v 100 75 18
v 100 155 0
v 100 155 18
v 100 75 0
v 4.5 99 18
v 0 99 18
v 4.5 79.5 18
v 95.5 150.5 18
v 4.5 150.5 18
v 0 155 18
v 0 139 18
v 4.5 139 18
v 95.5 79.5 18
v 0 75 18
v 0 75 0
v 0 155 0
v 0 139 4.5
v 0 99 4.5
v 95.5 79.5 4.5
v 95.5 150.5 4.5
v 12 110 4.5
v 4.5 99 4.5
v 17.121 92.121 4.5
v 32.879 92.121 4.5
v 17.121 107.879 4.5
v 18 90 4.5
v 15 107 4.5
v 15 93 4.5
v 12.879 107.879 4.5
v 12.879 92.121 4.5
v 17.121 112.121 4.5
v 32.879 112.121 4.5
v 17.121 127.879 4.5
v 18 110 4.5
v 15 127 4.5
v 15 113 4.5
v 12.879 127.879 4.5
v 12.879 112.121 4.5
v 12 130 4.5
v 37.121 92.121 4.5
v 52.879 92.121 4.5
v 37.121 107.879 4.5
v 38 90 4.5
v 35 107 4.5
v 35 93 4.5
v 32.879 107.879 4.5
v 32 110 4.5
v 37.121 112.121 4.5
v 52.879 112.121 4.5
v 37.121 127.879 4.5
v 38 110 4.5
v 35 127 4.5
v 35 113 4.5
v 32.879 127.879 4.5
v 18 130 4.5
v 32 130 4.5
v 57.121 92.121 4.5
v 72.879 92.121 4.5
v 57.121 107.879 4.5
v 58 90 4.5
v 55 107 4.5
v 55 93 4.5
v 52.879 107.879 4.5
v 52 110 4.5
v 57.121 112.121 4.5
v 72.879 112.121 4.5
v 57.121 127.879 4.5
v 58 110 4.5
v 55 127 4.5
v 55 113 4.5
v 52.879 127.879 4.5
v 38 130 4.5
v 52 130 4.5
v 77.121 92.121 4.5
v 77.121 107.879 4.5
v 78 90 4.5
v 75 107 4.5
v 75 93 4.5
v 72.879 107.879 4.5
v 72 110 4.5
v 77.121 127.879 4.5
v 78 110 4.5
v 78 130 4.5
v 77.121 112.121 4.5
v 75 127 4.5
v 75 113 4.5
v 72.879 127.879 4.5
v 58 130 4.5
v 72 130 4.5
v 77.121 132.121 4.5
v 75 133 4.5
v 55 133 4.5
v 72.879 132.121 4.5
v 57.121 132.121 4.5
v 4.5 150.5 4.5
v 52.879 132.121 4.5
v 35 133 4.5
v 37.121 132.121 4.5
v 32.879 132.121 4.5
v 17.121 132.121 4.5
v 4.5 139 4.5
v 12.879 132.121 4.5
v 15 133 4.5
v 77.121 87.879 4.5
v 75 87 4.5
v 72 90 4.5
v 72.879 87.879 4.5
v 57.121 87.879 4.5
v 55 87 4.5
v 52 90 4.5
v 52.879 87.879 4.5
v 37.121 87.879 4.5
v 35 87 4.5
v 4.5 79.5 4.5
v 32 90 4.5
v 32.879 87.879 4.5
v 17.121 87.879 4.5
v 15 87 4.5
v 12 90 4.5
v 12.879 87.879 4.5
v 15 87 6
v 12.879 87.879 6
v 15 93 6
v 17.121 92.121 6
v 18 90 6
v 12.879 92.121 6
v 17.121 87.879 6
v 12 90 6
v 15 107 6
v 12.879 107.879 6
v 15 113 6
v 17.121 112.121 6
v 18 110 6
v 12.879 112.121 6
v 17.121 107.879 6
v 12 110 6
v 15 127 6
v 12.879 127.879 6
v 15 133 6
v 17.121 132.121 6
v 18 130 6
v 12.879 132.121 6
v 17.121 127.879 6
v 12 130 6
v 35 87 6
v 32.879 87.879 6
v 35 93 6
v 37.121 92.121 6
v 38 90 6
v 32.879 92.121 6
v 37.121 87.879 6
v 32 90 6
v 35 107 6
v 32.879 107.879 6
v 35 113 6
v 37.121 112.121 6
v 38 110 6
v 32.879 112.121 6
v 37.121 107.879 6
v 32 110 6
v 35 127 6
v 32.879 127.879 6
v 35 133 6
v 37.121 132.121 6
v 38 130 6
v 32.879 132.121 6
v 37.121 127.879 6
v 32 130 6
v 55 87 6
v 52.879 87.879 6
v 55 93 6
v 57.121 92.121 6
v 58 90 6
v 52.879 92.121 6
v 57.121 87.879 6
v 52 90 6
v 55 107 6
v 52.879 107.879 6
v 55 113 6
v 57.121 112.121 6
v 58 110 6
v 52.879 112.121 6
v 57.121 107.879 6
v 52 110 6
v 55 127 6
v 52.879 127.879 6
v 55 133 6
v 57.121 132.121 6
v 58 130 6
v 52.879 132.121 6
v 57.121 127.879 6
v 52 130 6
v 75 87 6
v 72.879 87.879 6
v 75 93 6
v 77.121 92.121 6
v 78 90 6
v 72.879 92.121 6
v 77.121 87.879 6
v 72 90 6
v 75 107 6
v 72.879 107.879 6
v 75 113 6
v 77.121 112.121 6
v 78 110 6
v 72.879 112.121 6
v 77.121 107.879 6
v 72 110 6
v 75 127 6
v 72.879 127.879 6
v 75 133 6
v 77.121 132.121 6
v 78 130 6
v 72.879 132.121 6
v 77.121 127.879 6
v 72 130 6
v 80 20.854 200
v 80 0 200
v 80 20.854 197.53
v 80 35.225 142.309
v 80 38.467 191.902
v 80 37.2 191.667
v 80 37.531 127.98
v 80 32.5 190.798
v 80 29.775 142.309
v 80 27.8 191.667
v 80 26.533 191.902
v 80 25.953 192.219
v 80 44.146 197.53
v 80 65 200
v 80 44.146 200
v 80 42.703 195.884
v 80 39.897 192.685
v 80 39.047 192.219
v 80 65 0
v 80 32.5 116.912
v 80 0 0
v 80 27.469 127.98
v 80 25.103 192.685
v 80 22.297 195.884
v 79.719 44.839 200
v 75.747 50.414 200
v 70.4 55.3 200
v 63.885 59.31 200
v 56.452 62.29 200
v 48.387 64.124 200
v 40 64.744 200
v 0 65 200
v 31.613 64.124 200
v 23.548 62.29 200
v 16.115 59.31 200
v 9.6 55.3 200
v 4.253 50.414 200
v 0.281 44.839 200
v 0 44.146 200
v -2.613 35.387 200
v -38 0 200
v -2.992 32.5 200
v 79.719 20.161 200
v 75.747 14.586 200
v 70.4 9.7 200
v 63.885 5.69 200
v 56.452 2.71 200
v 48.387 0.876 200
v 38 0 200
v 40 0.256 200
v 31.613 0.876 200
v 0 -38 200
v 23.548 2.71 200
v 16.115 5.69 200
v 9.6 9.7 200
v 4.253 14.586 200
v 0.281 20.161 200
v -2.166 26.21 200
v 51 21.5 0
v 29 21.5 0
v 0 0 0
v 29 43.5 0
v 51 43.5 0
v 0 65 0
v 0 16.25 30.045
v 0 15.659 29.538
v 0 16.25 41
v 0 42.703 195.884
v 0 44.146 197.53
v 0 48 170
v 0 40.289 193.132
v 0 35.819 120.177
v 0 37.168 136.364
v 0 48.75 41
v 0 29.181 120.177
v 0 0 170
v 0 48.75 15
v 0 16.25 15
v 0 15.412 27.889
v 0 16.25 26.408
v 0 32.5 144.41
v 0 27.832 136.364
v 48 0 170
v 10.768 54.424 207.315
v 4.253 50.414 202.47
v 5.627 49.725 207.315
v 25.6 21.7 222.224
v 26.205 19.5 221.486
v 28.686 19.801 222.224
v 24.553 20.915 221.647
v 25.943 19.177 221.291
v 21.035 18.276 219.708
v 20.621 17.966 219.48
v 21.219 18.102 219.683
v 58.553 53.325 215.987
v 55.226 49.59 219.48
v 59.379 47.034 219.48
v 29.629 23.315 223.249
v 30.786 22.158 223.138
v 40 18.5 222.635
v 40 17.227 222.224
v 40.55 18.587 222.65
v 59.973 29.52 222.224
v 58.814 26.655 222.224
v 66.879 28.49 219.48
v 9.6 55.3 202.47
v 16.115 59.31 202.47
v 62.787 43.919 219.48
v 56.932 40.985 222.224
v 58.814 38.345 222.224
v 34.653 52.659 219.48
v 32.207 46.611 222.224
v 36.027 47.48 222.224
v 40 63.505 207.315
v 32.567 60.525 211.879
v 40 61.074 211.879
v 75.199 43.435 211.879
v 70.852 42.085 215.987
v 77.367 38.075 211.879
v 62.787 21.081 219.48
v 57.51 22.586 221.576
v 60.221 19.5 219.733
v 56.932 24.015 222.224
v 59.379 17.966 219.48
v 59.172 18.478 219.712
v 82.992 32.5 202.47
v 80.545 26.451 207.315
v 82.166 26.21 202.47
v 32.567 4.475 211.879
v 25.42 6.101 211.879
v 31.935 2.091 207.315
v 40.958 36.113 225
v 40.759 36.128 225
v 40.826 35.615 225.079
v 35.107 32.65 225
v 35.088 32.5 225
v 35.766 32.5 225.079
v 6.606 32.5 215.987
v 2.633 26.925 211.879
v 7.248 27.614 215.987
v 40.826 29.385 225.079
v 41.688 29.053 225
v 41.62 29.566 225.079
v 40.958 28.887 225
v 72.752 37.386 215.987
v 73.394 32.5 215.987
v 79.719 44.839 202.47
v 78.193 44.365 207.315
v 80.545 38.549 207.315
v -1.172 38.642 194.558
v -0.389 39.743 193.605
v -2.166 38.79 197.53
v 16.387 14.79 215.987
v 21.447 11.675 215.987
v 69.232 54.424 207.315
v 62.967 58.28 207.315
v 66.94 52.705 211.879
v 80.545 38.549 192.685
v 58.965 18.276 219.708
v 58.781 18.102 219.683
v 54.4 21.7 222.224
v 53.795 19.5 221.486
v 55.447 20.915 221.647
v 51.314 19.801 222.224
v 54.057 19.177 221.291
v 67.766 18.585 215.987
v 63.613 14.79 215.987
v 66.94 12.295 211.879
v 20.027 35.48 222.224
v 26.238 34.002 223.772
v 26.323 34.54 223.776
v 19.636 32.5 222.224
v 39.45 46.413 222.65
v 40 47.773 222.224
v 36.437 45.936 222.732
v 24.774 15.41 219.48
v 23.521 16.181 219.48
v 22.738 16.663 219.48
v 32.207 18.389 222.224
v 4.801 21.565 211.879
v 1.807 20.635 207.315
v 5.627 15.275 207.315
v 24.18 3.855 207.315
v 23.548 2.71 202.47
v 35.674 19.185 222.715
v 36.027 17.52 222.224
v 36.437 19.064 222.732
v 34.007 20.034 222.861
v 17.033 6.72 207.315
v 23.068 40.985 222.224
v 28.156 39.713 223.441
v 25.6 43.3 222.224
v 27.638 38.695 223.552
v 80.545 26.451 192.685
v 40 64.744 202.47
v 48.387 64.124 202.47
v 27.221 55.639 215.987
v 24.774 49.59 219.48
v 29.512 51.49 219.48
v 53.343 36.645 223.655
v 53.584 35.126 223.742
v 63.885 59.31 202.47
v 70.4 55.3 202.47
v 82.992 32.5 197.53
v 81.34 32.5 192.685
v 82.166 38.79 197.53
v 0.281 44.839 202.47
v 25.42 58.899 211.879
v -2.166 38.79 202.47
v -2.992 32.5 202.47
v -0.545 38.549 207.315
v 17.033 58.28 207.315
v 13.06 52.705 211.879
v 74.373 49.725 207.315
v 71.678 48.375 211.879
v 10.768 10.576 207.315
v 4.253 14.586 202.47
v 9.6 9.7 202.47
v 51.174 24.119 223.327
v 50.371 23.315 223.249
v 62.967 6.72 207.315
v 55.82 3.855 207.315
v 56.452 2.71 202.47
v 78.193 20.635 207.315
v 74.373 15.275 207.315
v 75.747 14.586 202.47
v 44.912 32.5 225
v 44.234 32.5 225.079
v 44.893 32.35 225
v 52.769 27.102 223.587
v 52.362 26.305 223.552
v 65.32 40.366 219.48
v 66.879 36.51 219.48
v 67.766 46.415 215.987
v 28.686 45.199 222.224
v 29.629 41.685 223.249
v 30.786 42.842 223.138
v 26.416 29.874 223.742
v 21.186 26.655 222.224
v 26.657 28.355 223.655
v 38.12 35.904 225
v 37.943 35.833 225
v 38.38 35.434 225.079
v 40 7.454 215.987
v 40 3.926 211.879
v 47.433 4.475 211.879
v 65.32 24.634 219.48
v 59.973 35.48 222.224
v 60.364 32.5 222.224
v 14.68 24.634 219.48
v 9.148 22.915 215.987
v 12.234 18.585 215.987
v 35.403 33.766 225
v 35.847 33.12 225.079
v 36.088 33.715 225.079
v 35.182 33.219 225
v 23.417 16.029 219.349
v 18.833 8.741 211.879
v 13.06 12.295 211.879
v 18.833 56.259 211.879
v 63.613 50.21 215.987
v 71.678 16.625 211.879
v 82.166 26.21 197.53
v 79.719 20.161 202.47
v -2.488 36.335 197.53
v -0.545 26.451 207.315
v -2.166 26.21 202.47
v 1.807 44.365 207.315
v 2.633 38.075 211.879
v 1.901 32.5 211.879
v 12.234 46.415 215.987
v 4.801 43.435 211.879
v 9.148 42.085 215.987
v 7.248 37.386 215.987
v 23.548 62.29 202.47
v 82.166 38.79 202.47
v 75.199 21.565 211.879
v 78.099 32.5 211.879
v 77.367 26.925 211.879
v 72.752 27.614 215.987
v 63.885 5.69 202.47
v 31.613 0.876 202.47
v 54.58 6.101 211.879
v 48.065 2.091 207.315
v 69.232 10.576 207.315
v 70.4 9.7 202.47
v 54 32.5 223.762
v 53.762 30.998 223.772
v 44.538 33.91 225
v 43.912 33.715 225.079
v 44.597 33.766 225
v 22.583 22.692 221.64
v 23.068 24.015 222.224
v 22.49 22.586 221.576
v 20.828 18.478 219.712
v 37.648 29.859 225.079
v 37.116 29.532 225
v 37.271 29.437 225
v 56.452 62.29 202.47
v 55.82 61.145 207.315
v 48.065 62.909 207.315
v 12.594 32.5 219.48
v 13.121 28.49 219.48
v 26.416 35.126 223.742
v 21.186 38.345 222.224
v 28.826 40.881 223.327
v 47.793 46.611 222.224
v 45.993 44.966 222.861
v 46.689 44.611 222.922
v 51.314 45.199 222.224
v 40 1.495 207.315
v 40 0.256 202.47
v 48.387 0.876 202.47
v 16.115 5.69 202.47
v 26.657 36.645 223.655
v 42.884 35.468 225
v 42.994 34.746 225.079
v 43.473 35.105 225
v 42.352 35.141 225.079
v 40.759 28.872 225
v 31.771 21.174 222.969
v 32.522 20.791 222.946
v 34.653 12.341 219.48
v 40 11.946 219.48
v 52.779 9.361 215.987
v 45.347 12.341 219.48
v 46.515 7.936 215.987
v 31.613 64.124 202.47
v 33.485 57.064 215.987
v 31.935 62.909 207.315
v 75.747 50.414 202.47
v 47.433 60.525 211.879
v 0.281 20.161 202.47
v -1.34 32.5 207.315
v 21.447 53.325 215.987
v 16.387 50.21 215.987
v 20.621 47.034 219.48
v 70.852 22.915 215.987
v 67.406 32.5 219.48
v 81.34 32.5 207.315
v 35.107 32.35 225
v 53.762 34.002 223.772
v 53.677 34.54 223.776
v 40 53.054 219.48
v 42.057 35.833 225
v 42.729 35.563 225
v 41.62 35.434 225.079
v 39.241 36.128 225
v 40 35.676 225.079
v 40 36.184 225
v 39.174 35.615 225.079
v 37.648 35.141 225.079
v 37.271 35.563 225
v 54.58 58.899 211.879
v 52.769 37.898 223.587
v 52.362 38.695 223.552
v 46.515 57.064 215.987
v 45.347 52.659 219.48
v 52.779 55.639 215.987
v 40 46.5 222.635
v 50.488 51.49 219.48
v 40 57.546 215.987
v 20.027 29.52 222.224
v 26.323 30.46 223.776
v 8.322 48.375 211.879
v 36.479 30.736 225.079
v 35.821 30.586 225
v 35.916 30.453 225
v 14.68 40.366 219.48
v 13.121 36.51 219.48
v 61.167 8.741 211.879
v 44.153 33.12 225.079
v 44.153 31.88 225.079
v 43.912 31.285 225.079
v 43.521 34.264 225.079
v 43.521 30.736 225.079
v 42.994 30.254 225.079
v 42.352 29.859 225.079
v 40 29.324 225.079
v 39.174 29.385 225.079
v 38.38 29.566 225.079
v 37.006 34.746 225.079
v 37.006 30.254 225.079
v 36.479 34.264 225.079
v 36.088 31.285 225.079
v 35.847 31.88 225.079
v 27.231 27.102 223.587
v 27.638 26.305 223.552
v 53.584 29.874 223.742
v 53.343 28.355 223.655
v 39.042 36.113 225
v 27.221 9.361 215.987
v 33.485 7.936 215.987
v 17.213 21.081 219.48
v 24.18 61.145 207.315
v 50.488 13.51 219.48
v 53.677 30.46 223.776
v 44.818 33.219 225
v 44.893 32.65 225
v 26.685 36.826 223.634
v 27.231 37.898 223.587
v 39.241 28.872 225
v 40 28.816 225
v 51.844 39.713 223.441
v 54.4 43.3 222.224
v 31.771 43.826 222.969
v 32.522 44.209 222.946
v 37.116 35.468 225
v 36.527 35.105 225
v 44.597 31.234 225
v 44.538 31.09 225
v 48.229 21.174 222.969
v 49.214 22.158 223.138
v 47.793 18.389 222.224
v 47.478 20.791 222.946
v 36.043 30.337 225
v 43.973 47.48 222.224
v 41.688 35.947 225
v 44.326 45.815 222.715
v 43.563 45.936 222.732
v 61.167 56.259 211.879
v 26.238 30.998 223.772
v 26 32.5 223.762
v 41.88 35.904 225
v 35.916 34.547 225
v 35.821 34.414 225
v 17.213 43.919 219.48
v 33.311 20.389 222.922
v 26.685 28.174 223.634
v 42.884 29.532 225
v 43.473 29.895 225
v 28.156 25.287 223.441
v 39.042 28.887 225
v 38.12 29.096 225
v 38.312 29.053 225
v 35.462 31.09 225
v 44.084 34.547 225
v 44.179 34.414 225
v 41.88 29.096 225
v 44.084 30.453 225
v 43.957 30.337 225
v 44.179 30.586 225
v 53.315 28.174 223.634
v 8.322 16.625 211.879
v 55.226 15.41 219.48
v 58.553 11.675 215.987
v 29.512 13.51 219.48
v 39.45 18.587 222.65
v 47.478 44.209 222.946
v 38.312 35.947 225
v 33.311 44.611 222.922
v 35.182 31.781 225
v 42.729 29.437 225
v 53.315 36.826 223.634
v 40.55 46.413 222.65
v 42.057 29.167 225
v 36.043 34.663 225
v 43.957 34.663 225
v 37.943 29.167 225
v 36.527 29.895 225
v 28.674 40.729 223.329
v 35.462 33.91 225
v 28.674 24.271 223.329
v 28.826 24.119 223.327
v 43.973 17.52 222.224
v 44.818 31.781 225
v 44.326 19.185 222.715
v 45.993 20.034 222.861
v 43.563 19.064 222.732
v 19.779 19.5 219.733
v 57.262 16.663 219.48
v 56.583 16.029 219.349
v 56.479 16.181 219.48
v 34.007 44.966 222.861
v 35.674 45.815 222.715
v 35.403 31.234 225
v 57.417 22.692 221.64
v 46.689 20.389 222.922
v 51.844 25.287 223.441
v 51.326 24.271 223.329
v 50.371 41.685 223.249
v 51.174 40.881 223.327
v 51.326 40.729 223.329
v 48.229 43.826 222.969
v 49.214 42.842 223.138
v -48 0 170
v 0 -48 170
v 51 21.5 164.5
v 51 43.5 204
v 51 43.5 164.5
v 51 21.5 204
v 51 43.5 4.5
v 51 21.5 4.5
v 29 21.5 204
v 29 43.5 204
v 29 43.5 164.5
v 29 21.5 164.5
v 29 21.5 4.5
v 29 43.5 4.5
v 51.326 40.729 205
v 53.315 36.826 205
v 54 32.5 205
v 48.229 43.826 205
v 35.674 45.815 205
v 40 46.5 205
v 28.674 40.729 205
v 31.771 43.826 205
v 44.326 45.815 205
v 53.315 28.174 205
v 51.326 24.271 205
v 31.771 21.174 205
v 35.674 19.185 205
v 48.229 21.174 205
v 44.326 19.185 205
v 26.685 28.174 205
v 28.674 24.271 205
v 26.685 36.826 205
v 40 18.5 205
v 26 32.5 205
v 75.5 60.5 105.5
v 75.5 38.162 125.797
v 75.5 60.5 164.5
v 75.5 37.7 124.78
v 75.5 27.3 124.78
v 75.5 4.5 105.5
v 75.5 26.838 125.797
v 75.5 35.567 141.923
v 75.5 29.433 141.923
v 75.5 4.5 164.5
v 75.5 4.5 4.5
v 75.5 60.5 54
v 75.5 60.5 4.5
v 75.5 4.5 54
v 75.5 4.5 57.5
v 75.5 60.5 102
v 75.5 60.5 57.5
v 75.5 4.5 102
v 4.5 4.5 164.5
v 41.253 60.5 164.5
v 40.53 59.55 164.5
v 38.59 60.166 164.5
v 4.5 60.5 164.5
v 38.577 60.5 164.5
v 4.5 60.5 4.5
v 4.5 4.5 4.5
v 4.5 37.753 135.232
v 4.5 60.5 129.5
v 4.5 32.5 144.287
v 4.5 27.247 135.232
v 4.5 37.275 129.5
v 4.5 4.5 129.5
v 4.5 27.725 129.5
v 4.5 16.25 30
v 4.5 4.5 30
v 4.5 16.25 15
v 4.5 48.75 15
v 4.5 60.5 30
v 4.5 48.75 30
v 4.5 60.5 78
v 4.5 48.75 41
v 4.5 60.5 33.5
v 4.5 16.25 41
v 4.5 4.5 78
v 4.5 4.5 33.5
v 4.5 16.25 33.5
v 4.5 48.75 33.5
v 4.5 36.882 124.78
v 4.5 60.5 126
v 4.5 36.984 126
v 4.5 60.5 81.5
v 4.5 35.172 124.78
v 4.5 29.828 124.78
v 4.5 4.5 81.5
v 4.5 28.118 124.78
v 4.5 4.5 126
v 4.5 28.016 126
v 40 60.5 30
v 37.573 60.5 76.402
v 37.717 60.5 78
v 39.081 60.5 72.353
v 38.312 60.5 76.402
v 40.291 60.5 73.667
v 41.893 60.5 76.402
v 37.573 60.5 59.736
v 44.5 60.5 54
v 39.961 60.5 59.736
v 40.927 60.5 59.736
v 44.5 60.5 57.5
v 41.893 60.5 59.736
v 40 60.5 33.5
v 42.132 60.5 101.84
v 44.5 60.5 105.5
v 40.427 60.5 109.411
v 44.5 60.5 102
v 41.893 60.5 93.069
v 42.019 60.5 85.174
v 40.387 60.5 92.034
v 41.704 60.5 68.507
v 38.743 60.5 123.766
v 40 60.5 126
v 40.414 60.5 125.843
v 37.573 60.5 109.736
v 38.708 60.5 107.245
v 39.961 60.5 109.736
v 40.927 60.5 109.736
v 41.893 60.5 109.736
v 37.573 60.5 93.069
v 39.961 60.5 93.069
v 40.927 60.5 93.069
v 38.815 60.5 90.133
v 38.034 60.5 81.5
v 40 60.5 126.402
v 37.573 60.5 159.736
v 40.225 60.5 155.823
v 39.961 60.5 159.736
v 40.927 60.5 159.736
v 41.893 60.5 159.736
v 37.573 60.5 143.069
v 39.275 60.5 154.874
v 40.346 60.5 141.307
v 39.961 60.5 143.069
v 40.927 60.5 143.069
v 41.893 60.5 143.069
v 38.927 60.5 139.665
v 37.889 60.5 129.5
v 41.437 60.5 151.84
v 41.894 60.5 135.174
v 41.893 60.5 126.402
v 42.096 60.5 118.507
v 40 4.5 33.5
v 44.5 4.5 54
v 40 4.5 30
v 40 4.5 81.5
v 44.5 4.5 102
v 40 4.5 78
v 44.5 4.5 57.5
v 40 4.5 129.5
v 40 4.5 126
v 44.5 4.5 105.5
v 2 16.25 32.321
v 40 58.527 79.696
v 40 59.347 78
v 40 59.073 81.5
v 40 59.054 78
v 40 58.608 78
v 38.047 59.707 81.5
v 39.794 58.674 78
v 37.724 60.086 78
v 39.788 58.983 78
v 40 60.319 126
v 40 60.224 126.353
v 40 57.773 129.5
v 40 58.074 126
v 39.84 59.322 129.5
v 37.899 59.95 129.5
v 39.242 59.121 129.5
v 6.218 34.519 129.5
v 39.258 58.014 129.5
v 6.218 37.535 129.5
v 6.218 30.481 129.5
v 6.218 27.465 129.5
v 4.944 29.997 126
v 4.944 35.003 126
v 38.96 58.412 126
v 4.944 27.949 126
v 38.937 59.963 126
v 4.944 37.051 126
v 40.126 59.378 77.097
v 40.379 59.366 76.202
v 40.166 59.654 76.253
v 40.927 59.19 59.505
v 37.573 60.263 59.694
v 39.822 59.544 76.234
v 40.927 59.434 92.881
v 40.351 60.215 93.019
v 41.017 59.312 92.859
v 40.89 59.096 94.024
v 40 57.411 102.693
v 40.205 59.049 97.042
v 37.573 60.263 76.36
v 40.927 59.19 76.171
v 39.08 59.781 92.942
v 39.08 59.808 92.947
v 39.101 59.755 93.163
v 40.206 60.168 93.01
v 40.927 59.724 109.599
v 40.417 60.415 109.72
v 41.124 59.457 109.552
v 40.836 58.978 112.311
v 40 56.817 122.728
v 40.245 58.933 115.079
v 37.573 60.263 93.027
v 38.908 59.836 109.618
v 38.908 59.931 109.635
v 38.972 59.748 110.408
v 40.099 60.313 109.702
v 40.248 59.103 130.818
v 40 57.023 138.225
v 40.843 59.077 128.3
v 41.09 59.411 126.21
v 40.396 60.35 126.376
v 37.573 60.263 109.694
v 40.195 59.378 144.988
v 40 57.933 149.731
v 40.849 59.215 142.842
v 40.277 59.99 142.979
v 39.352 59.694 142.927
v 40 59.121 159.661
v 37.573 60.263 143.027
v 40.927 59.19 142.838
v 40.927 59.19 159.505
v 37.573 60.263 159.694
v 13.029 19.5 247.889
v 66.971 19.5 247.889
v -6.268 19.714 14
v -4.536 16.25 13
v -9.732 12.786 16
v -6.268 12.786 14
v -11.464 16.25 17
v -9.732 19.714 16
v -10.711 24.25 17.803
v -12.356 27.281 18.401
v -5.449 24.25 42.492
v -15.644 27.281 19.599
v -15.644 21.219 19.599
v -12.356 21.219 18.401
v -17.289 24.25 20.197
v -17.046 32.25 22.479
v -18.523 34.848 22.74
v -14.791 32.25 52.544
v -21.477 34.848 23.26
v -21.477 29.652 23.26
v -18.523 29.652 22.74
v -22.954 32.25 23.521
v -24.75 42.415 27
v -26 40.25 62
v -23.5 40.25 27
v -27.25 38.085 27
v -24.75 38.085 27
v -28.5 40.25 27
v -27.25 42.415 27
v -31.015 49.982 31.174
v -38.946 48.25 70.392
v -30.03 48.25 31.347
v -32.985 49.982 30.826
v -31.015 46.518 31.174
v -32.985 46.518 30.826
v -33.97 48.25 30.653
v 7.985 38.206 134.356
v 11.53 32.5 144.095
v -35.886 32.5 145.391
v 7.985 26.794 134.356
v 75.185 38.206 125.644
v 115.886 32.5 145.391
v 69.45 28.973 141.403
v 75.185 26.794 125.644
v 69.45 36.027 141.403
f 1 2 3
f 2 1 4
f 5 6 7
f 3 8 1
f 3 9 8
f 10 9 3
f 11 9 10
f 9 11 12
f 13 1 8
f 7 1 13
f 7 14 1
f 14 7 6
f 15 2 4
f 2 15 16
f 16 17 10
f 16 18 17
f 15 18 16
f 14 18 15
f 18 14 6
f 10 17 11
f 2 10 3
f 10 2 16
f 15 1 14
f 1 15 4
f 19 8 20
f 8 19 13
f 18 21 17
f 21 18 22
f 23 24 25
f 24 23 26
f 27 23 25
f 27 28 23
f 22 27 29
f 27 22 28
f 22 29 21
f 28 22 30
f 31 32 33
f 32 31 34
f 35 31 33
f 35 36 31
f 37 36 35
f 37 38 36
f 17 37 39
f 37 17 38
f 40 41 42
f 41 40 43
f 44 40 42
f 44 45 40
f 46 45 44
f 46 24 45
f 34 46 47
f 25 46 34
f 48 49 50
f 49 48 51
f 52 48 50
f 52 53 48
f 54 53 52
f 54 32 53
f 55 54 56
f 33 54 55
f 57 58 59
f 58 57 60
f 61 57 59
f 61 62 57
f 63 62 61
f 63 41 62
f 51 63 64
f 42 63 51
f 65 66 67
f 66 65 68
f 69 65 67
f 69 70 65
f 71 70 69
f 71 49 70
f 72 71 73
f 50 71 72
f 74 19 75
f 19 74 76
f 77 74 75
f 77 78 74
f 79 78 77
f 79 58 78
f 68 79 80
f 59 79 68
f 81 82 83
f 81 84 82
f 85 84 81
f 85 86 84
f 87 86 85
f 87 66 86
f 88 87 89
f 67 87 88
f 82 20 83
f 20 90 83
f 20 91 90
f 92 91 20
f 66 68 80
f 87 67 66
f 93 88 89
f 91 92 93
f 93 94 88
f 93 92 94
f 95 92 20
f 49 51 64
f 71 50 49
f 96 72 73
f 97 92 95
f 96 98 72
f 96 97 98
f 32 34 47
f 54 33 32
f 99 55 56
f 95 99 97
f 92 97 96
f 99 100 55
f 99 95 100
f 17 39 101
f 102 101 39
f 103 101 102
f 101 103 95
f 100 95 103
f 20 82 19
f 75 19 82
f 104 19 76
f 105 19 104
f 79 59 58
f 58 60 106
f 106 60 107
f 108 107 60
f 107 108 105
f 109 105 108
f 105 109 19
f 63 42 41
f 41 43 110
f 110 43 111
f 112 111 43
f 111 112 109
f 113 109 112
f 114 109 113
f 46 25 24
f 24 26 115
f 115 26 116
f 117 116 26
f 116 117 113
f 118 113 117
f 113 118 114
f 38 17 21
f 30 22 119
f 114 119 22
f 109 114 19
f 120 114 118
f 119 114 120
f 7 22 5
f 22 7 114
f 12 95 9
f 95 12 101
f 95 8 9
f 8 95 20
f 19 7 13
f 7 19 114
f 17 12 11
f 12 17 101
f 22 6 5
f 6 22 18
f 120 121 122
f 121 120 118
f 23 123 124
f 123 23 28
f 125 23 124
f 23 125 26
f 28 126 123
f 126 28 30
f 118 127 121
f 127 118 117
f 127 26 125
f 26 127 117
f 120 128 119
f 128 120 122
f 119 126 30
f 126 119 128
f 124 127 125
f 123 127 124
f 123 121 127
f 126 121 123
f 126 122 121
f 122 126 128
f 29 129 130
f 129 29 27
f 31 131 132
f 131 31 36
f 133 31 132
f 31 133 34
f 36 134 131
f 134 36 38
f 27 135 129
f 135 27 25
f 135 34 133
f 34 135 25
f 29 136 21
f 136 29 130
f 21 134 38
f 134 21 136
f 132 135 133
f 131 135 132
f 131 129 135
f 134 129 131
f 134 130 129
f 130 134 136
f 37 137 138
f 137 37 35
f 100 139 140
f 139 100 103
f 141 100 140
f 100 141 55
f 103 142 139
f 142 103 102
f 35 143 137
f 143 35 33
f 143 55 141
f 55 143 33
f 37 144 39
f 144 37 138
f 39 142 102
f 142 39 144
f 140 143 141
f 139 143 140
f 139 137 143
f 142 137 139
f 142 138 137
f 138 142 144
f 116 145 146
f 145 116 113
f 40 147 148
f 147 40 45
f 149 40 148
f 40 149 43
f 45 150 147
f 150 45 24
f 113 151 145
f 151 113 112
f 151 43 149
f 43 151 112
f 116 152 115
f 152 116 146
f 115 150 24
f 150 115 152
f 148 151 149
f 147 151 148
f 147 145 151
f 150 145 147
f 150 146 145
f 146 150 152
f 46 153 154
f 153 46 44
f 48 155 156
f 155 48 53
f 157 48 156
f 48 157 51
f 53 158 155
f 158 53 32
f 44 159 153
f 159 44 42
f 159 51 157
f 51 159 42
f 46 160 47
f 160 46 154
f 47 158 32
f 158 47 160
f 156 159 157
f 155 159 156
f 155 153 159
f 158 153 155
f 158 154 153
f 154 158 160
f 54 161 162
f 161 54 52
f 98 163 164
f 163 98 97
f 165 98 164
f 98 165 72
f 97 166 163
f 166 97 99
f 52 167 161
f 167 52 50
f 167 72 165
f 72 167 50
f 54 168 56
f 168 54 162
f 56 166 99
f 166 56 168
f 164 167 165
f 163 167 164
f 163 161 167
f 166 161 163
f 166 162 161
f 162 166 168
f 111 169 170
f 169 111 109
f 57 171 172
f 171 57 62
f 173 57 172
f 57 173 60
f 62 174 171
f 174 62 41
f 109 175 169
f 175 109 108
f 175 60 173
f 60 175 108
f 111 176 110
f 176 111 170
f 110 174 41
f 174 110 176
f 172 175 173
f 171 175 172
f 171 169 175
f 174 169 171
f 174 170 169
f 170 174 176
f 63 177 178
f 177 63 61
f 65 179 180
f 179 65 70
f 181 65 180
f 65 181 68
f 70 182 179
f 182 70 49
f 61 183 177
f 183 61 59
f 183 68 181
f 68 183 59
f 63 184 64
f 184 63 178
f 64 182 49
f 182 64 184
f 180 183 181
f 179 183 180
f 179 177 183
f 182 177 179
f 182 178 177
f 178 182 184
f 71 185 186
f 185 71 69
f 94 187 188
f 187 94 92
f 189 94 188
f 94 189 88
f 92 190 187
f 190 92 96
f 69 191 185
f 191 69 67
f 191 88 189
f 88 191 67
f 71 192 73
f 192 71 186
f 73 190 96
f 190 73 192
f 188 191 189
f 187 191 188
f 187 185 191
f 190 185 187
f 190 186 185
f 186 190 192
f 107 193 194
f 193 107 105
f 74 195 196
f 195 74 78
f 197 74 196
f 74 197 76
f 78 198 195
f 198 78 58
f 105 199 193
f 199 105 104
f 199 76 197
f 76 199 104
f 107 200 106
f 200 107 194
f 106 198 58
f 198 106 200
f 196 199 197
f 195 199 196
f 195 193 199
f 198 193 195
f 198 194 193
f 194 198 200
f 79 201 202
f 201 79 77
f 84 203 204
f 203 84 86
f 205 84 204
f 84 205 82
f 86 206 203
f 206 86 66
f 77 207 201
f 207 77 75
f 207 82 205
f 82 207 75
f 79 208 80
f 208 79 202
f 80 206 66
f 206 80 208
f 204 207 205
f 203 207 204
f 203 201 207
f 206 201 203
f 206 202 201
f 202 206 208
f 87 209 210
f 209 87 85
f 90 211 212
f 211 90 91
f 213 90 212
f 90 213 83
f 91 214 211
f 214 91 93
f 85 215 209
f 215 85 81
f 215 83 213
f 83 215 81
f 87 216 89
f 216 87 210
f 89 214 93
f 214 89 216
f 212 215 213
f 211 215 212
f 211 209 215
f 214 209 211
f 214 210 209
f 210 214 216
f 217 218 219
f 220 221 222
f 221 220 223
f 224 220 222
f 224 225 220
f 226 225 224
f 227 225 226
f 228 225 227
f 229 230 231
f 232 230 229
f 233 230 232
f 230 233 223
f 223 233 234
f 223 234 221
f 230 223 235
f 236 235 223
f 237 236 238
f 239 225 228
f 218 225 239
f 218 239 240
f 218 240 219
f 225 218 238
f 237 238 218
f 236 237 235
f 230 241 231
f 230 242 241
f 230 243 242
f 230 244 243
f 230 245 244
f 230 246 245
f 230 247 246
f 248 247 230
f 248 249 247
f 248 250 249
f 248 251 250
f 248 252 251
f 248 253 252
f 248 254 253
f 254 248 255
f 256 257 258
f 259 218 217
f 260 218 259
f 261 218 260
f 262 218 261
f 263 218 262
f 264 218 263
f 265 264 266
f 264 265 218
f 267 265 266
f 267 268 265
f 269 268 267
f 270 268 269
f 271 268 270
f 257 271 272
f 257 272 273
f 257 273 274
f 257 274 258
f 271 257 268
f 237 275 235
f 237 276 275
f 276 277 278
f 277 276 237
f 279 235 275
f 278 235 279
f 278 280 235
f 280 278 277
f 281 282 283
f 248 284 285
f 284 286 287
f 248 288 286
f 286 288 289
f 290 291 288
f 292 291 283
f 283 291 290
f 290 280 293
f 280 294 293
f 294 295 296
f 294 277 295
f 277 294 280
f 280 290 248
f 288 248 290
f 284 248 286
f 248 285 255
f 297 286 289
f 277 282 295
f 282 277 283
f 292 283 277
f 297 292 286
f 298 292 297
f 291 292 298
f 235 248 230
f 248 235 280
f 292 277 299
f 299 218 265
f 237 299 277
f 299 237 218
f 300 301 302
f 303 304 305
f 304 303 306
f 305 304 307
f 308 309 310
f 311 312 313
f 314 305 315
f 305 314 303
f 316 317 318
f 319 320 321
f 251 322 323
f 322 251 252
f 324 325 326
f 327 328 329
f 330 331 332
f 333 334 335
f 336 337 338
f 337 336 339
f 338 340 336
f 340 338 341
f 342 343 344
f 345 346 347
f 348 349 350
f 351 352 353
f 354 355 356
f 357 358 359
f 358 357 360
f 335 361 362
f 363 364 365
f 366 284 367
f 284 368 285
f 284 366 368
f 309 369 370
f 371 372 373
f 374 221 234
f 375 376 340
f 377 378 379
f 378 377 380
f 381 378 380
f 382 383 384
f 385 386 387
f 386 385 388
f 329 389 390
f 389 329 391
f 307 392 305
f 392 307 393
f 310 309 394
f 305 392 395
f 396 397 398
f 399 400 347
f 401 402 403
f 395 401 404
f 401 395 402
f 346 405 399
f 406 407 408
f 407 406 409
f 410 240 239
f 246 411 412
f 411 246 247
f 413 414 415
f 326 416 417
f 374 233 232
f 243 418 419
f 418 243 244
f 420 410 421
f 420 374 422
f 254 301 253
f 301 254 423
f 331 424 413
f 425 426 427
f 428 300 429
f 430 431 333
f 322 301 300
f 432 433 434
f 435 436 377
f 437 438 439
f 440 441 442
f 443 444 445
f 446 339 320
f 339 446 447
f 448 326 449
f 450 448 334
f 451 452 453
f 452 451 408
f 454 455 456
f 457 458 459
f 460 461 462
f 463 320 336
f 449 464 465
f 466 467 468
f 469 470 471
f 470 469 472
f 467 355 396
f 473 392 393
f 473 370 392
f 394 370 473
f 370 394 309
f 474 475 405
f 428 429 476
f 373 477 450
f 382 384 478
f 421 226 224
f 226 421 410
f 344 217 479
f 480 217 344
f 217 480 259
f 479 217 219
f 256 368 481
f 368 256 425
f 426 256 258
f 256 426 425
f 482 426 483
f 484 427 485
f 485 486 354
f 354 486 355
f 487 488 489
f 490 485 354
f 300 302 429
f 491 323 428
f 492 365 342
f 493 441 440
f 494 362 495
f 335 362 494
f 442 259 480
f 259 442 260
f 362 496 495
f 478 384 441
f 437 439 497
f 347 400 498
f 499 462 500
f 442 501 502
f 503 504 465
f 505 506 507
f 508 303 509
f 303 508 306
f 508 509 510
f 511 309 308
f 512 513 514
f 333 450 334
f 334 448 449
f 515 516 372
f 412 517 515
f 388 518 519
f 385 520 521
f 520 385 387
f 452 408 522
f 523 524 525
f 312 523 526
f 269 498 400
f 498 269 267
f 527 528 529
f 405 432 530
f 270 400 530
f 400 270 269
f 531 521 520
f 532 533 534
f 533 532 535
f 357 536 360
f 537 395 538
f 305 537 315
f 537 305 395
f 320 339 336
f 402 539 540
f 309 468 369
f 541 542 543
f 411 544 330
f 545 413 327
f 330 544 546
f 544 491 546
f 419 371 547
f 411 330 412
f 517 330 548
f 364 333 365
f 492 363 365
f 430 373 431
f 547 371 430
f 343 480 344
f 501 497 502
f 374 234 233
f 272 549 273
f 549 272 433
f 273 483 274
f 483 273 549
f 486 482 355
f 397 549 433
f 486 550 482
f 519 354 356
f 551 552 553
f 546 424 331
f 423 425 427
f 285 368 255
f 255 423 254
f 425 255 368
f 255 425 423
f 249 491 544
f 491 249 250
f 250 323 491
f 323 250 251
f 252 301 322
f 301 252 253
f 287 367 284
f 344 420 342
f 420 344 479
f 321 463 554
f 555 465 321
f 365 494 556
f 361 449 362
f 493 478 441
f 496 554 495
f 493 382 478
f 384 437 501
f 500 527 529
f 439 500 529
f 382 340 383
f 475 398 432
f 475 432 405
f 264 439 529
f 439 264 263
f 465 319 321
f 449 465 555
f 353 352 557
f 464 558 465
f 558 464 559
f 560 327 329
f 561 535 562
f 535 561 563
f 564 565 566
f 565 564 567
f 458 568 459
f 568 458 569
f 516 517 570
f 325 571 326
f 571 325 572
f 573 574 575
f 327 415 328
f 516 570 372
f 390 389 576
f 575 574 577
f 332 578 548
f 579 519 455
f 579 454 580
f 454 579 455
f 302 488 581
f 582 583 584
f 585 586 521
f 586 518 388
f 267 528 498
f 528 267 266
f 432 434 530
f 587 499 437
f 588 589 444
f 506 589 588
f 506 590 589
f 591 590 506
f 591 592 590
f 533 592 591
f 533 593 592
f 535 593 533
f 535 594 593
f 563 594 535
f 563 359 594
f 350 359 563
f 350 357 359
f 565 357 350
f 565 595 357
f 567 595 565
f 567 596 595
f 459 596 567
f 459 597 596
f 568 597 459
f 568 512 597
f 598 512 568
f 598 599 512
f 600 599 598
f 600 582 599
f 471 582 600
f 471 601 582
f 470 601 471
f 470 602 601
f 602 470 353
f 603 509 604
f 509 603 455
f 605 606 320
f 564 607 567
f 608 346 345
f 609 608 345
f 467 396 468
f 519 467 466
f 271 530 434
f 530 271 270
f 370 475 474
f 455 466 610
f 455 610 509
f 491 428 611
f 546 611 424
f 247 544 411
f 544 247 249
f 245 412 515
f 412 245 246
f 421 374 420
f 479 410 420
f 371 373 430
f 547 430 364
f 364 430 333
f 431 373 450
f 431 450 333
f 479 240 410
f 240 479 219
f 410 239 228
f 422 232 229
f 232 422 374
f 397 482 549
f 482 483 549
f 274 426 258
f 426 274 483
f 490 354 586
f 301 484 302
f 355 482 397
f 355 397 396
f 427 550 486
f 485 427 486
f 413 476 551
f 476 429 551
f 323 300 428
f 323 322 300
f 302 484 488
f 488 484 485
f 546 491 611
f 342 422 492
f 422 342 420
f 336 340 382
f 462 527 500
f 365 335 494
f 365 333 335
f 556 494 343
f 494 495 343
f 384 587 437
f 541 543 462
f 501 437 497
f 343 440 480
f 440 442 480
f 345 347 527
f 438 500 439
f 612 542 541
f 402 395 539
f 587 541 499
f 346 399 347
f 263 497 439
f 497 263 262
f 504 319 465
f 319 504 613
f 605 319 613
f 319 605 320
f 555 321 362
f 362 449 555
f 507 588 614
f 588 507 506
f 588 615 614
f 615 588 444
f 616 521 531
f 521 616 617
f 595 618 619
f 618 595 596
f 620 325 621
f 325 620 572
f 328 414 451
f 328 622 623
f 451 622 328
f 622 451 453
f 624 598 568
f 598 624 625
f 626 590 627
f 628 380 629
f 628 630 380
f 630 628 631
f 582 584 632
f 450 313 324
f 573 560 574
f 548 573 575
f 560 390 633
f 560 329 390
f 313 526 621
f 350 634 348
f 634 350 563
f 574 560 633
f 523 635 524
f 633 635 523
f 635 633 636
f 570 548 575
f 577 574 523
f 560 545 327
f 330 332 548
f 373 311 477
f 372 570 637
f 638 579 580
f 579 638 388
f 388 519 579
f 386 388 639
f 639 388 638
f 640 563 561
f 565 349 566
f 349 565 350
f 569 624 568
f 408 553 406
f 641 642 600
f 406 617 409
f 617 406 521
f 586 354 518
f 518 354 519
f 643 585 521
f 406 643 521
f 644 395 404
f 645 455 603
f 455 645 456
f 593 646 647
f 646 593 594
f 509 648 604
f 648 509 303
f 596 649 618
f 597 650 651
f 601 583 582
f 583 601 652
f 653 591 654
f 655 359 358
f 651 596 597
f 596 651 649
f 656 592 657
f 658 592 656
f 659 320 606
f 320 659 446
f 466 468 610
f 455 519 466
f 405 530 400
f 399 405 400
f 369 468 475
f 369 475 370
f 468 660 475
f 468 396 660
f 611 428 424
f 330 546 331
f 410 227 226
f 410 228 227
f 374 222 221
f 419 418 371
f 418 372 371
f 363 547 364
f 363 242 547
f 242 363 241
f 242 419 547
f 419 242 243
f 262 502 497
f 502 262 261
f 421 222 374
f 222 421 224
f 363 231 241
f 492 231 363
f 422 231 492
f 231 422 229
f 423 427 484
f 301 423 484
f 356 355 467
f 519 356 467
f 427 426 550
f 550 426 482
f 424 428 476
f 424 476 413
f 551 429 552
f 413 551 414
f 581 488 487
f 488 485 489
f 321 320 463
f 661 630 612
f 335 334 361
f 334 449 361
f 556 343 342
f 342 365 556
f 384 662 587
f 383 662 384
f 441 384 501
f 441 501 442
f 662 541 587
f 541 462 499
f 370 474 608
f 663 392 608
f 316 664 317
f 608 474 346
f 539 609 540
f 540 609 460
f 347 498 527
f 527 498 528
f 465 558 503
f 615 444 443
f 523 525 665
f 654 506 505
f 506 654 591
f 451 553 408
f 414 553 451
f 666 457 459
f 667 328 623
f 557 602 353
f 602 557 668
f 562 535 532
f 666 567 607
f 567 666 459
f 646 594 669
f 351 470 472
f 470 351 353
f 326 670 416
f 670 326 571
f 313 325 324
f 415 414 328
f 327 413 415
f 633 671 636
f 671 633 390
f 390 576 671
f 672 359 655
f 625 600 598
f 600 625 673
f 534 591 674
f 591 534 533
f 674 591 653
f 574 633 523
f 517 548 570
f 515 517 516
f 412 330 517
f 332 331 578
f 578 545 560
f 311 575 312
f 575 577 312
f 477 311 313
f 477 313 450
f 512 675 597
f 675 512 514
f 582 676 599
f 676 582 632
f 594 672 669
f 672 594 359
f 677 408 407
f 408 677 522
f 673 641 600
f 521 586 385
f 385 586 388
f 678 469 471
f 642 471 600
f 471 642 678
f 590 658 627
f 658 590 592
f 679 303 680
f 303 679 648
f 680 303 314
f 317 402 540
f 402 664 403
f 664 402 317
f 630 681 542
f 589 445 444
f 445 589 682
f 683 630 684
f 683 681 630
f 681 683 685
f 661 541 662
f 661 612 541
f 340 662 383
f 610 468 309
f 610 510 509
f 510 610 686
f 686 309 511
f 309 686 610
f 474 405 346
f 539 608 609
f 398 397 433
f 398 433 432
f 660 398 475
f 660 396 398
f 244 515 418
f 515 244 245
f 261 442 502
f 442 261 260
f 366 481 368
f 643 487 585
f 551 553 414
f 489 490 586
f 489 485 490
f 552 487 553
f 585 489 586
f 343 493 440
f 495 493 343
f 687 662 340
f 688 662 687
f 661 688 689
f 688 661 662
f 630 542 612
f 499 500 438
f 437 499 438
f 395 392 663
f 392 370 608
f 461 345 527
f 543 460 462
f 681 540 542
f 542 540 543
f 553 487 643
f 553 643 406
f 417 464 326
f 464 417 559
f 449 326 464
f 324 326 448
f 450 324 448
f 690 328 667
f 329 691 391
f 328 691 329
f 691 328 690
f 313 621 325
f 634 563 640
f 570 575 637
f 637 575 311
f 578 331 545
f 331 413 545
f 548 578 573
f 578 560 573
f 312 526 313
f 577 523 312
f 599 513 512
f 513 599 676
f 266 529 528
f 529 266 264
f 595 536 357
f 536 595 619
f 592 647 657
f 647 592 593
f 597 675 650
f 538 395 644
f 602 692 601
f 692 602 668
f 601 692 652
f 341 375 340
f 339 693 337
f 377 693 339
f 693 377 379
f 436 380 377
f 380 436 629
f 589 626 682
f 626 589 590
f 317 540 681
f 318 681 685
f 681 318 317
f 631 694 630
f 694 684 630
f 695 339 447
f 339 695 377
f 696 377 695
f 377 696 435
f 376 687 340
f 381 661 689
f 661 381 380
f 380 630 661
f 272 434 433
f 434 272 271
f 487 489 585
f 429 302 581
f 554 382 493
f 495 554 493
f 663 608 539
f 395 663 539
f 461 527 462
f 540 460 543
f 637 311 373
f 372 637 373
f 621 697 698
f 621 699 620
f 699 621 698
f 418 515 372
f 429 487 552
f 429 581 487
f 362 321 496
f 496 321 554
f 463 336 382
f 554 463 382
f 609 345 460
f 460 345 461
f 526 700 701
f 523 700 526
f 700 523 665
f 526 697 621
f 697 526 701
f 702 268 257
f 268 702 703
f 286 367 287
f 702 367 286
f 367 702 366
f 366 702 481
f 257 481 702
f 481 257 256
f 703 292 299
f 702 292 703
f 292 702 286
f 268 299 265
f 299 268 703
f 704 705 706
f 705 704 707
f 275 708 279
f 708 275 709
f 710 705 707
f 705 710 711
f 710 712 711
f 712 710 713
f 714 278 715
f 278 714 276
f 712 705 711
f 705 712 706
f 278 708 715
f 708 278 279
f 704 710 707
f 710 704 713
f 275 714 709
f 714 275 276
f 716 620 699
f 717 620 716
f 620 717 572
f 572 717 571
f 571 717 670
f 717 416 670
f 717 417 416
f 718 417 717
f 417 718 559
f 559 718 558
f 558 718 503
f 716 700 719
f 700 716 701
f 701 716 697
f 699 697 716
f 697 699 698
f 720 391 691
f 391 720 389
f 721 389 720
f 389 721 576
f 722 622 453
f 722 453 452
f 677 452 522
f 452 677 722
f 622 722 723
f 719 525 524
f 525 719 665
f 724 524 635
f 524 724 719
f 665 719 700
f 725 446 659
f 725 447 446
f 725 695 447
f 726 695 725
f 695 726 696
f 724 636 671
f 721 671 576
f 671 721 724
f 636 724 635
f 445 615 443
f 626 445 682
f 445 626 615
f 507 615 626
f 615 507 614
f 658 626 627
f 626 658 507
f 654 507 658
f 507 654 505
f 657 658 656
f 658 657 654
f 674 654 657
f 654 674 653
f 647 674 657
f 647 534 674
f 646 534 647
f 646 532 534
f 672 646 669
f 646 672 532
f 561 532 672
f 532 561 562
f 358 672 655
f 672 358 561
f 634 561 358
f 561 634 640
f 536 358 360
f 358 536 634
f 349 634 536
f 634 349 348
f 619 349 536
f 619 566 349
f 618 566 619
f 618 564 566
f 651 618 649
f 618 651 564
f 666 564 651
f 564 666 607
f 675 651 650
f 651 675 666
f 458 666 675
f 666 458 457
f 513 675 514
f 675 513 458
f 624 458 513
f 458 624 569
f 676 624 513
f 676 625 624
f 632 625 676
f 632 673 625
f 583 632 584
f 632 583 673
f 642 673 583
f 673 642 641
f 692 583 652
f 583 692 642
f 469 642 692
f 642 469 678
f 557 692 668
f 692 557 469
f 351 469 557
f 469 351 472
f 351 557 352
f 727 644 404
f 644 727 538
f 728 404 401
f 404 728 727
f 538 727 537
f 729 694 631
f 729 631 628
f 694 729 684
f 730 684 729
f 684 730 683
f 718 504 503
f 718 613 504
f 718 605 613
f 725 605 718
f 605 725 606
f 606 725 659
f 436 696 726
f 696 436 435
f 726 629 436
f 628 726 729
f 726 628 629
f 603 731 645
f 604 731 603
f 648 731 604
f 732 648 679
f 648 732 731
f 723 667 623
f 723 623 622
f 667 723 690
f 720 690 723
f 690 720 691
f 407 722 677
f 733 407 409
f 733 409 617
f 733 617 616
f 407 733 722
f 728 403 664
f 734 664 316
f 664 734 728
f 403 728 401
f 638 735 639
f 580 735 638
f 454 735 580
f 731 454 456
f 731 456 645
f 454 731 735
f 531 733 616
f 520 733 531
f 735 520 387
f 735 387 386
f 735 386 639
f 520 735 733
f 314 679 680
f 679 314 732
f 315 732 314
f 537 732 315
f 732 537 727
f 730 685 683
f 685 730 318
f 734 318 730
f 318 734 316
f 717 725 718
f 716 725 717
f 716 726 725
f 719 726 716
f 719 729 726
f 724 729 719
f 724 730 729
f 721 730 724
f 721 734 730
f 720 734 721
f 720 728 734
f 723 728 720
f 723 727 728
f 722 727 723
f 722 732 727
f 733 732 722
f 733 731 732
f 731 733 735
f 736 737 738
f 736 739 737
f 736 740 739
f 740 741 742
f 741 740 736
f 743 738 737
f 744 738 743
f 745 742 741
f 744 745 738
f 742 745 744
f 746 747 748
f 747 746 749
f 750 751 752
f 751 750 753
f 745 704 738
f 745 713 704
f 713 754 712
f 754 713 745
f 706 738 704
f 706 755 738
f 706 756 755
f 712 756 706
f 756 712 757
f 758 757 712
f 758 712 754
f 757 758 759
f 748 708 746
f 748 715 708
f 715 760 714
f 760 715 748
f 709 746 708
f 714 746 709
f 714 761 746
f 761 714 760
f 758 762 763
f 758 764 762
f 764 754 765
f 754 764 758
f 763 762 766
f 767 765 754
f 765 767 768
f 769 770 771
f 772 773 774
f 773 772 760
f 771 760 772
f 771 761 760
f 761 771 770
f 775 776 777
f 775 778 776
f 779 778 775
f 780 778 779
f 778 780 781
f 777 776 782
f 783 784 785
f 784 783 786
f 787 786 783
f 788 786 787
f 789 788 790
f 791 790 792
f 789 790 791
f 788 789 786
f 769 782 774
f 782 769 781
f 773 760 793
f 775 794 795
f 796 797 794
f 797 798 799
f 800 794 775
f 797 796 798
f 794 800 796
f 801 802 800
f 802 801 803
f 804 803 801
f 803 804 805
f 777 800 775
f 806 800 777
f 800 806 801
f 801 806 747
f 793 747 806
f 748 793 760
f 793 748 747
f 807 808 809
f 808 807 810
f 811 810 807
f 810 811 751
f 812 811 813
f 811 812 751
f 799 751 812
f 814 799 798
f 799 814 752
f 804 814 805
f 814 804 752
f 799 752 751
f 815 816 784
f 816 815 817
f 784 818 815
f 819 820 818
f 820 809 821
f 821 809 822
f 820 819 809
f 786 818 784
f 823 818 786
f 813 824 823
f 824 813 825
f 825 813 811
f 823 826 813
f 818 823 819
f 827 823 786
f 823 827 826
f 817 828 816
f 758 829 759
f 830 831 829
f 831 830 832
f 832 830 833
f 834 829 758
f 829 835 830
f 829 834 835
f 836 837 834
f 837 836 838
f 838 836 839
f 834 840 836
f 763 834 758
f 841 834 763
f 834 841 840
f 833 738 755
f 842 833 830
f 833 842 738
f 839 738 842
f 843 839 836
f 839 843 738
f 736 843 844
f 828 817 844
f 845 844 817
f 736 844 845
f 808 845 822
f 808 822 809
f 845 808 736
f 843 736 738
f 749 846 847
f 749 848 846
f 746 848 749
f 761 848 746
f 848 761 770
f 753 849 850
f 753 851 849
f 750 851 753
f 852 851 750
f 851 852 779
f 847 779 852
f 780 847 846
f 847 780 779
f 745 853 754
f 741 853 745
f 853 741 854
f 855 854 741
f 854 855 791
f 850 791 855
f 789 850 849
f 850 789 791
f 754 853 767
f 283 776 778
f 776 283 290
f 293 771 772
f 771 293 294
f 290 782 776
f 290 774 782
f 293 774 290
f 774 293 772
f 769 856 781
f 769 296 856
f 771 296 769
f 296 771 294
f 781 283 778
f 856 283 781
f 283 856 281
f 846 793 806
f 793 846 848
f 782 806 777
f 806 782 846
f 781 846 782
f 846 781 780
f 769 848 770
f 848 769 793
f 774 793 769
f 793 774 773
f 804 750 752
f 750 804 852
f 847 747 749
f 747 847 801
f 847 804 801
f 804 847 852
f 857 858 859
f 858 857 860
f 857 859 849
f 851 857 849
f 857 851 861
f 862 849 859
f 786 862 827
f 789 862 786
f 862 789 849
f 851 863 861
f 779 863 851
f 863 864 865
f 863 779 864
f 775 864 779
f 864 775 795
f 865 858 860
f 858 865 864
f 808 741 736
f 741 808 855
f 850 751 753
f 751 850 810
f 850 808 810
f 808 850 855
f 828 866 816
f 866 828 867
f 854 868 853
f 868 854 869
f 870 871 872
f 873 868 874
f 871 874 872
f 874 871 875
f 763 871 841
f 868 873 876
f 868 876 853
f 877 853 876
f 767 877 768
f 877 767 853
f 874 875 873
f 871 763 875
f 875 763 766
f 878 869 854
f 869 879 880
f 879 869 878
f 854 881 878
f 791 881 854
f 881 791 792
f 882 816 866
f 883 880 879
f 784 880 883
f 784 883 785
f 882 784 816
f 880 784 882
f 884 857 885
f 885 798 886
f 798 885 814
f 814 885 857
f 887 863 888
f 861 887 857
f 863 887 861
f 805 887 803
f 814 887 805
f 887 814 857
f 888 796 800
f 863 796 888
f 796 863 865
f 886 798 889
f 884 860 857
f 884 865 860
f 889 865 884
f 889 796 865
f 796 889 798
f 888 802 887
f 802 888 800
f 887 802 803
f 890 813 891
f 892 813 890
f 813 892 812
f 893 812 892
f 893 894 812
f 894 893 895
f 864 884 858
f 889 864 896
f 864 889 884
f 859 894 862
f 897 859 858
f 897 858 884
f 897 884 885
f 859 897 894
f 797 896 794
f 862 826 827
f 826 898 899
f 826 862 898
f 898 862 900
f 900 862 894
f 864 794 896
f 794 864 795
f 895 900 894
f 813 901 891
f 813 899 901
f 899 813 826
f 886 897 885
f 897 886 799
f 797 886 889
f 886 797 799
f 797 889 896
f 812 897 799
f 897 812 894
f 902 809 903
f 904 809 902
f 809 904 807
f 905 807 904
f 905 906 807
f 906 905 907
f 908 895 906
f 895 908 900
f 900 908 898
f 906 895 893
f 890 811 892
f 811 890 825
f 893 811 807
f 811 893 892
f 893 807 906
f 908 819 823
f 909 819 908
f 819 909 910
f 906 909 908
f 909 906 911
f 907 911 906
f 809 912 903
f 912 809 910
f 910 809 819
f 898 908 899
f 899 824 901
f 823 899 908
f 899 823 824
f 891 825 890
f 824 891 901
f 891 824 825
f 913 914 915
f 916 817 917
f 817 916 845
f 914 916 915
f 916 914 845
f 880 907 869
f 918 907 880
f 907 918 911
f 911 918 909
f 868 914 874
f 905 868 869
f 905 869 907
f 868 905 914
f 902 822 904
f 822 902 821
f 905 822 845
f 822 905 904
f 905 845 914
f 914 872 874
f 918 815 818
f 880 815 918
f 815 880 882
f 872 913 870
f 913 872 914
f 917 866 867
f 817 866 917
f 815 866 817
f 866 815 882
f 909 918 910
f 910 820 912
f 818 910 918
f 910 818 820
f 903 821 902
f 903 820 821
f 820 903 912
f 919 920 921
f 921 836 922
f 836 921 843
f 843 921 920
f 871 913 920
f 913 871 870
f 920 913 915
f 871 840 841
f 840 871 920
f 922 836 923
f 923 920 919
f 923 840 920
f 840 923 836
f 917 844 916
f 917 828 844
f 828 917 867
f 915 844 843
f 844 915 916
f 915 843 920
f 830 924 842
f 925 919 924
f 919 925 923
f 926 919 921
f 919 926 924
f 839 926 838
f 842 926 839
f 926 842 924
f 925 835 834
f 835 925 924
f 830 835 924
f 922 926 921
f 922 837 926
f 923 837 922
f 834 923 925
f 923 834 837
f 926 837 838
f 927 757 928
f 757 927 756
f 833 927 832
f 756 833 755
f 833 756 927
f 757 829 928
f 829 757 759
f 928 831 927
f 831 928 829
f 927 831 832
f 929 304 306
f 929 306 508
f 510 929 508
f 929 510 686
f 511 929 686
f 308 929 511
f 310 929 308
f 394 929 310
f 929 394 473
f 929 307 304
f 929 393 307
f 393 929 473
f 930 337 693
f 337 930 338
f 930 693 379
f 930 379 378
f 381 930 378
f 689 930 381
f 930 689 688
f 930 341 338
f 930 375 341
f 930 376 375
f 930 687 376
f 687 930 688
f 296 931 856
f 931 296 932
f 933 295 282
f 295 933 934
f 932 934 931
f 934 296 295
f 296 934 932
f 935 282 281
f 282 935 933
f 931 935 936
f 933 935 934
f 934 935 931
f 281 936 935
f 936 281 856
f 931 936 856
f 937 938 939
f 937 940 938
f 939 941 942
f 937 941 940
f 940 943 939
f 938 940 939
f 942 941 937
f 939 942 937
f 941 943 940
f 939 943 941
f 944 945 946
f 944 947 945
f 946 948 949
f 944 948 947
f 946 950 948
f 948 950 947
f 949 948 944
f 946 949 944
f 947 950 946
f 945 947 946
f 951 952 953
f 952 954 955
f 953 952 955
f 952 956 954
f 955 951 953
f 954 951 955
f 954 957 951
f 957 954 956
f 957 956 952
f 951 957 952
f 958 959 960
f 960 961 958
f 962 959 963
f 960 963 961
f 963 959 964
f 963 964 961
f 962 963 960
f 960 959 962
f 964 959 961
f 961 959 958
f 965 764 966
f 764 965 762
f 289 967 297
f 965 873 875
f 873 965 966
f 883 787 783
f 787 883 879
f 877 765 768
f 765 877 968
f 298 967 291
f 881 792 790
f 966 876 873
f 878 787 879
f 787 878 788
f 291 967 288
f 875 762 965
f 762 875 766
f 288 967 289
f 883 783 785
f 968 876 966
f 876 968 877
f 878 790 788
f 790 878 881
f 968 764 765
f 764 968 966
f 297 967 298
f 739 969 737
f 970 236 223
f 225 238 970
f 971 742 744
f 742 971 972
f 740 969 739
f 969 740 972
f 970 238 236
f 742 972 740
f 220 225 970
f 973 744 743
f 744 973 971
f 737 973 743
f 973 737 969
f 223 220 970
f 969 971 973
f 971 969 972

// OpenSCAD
// Dragon Dice Tower — Tabletop RPG Accessory
// Roll dice through the dragon's body; exit through the mouth
// DUAL COLOR: body (dark grey/black) | spines + flame (gold/orange)
// PLA — 0.2mm, 4 walls, 15% infill
// Dice: fits standard 16mm d6 through internals

TOWER_W   = 80;
TOWER_D   = 65;
TOWER_H   = 200;
WALL_T    = 4.5;
DICE_PASS = 22;    // Dice passage clearance (16mm d6 diag = ~22mm)
TRAY_W    = 100;
TRAY_D    = 80;
TRAY_H    = 18;

// ── Dice tray (catches dice) ──────────────────────────
module dice_tray() {
    difference() {
        cube([TRAY_W, TRAY_D, TRAY_H]);
        translate([WALL_T, WALL_T, WALL_T])
            cube([TRAY_W - WALL_T*2, TRAY_D - WALL_T*2, TRAY_H]);
        // Front opening (see dice roll)
        translate([-1, TRAY_D * 0.3, WALL_T])
            cube([WALL_T + 2, TRAY_D * 0.5, TRAY_H]);
    }
    // Non-slip bumps on tray floor
    for (x = [15:20:TRAY_W - 15], y = [15:20:TRAY_D - 15])
        translate([x, y, WALL_T])
            cylinder(d = 6, h = 1.5, $fn = 8);
}

// ── Tower body ────────────────────────────────────────
module tower_body() {
    difference() {
        union() {
            // Main rectangular shaft
            cube([TOWER_W, TOWER_D, TOWER_H]);
            // Head (top — dragon head shape)
            translate([TOWER_W/2, TOWER_D/2, TOWER_H])
                scale([1.2, 0.9, 0.7])
                    sphere(d = TOWER_W * 0.9, $fn = 32);
            // Neck taper
            translate([0, 0, TOWER_H - 30])
                cylinder(d1 = TOWER_W * 1.2, d2 = TOWER_W * 0.95, h = 30, $fn = 4);
        }
        // Dice channel (internal zigzag baffles)
        translate([TOWER_W/2 - DICE_PASS/2, TOWER_D/2 - DICE_PASS/2, -1])
            cube([DICE_PASS, DICE_PASS, TOWER_H + 5]);
        // Top input hole
        translate([TOWER_W/2, TOWER_D/2, TOWER_H + 5])
            cylinder(d = DICE_PASS + 6, h = 20, $fn = 20);
        // Hollow body (weight reduction)
        translate([WALL_T, WALL_T, WALL_T])
            cube([TOWER_W - WALL_T*2, TOWER_D - WALL_T*2, TOWER_H - 40]);
        // Mouth exit (front, at base)
        translate([-1, TOWER_D * 0.25, 15])
            cube([WALL_T + 2, TOWER_D * 0.5, DICE_PASS + 4]);
    }
}

// ── Zigzag baffles (inside tower — randomize dice) ────
module baffles() {
    N = 5;
    for (i = [0 : N - 1]) {
        z = 30 + i * (TOWER_H - 80) / N;
        side = (i % 2 == 0) ? 0 : 1;
        translate([side == 0 ? WALL_T : TOWER_W/2 + WALL_T,
                   WALL_T, z])
            cube([TOWER_W/2 - WALL_T, TOWER_D - WALL_T*2, 3.5]);
    }
}

// ── Dragon details (Color 2 — gold/orange) ────────────
module dragon_spines() {
    // Dorsal spines along top
    for (i = [0:6]) {
        z = TOWER_H * 0.3 + i * (TOWER_H * 0.5) / 6;
        h = 20 + sin(i * 40) * 10;
        translate([TOWER_W * 0.5, TOWER_D - 3, z])
            rotate([10, 0, 0])
                cylinder(d1 = 6, d2 = 0, h = h, $fn = 5);
    }
    // Horn pair on head
    for (sx = [-1, 1])
        translate([TOWER_W/2 + sx * 15, TOWER_D * 0.3, TOWER_H + 15])
            rotate([0, sx * 20, 0])
                cylinder(d1 = 8, d2 = 0, h = 35, $fn = 4);
    // Eyes
    for (sx = [-1, 1])
        translate([TOWER_W/2 + sx * 12, TOWER_D * 0.15, TOWER_H + 8])
            sphere(d = 10, $fn = 14);
    // Flame licks at exit
    for (i = [0:4]) {
        translate([-8 - i * 6, TOWER_D * 0.25 + i * 8, 15 + i * 4])
            rotate([0, 30 - i * 10, 0])
                cylinder(d1 = 8 - i, d2 = 0, h = 20 + i * 5, $fn = 6);
    }
    // Wing nubs (decorative)
    for (sx = [-1, 1])
        translate([TOWER_W/2 + sx * TOWER_W * 0.42, TOWER_D/2, TOWER_H * 0.65])
            rotate([0, sx * 70, 0])
                scale([1, 0.4, 1])
                    cylinder(d1 = 30, d2 = 0, h = 45, $fn = 5);
}

// Color 1 (dark): body + tray
translate([0, TOWER_D + 10, 0]) dice_tray();
tower_body();
baffles();
// Color 2 (gold): spines + flame + eyes
dragon_spines();
